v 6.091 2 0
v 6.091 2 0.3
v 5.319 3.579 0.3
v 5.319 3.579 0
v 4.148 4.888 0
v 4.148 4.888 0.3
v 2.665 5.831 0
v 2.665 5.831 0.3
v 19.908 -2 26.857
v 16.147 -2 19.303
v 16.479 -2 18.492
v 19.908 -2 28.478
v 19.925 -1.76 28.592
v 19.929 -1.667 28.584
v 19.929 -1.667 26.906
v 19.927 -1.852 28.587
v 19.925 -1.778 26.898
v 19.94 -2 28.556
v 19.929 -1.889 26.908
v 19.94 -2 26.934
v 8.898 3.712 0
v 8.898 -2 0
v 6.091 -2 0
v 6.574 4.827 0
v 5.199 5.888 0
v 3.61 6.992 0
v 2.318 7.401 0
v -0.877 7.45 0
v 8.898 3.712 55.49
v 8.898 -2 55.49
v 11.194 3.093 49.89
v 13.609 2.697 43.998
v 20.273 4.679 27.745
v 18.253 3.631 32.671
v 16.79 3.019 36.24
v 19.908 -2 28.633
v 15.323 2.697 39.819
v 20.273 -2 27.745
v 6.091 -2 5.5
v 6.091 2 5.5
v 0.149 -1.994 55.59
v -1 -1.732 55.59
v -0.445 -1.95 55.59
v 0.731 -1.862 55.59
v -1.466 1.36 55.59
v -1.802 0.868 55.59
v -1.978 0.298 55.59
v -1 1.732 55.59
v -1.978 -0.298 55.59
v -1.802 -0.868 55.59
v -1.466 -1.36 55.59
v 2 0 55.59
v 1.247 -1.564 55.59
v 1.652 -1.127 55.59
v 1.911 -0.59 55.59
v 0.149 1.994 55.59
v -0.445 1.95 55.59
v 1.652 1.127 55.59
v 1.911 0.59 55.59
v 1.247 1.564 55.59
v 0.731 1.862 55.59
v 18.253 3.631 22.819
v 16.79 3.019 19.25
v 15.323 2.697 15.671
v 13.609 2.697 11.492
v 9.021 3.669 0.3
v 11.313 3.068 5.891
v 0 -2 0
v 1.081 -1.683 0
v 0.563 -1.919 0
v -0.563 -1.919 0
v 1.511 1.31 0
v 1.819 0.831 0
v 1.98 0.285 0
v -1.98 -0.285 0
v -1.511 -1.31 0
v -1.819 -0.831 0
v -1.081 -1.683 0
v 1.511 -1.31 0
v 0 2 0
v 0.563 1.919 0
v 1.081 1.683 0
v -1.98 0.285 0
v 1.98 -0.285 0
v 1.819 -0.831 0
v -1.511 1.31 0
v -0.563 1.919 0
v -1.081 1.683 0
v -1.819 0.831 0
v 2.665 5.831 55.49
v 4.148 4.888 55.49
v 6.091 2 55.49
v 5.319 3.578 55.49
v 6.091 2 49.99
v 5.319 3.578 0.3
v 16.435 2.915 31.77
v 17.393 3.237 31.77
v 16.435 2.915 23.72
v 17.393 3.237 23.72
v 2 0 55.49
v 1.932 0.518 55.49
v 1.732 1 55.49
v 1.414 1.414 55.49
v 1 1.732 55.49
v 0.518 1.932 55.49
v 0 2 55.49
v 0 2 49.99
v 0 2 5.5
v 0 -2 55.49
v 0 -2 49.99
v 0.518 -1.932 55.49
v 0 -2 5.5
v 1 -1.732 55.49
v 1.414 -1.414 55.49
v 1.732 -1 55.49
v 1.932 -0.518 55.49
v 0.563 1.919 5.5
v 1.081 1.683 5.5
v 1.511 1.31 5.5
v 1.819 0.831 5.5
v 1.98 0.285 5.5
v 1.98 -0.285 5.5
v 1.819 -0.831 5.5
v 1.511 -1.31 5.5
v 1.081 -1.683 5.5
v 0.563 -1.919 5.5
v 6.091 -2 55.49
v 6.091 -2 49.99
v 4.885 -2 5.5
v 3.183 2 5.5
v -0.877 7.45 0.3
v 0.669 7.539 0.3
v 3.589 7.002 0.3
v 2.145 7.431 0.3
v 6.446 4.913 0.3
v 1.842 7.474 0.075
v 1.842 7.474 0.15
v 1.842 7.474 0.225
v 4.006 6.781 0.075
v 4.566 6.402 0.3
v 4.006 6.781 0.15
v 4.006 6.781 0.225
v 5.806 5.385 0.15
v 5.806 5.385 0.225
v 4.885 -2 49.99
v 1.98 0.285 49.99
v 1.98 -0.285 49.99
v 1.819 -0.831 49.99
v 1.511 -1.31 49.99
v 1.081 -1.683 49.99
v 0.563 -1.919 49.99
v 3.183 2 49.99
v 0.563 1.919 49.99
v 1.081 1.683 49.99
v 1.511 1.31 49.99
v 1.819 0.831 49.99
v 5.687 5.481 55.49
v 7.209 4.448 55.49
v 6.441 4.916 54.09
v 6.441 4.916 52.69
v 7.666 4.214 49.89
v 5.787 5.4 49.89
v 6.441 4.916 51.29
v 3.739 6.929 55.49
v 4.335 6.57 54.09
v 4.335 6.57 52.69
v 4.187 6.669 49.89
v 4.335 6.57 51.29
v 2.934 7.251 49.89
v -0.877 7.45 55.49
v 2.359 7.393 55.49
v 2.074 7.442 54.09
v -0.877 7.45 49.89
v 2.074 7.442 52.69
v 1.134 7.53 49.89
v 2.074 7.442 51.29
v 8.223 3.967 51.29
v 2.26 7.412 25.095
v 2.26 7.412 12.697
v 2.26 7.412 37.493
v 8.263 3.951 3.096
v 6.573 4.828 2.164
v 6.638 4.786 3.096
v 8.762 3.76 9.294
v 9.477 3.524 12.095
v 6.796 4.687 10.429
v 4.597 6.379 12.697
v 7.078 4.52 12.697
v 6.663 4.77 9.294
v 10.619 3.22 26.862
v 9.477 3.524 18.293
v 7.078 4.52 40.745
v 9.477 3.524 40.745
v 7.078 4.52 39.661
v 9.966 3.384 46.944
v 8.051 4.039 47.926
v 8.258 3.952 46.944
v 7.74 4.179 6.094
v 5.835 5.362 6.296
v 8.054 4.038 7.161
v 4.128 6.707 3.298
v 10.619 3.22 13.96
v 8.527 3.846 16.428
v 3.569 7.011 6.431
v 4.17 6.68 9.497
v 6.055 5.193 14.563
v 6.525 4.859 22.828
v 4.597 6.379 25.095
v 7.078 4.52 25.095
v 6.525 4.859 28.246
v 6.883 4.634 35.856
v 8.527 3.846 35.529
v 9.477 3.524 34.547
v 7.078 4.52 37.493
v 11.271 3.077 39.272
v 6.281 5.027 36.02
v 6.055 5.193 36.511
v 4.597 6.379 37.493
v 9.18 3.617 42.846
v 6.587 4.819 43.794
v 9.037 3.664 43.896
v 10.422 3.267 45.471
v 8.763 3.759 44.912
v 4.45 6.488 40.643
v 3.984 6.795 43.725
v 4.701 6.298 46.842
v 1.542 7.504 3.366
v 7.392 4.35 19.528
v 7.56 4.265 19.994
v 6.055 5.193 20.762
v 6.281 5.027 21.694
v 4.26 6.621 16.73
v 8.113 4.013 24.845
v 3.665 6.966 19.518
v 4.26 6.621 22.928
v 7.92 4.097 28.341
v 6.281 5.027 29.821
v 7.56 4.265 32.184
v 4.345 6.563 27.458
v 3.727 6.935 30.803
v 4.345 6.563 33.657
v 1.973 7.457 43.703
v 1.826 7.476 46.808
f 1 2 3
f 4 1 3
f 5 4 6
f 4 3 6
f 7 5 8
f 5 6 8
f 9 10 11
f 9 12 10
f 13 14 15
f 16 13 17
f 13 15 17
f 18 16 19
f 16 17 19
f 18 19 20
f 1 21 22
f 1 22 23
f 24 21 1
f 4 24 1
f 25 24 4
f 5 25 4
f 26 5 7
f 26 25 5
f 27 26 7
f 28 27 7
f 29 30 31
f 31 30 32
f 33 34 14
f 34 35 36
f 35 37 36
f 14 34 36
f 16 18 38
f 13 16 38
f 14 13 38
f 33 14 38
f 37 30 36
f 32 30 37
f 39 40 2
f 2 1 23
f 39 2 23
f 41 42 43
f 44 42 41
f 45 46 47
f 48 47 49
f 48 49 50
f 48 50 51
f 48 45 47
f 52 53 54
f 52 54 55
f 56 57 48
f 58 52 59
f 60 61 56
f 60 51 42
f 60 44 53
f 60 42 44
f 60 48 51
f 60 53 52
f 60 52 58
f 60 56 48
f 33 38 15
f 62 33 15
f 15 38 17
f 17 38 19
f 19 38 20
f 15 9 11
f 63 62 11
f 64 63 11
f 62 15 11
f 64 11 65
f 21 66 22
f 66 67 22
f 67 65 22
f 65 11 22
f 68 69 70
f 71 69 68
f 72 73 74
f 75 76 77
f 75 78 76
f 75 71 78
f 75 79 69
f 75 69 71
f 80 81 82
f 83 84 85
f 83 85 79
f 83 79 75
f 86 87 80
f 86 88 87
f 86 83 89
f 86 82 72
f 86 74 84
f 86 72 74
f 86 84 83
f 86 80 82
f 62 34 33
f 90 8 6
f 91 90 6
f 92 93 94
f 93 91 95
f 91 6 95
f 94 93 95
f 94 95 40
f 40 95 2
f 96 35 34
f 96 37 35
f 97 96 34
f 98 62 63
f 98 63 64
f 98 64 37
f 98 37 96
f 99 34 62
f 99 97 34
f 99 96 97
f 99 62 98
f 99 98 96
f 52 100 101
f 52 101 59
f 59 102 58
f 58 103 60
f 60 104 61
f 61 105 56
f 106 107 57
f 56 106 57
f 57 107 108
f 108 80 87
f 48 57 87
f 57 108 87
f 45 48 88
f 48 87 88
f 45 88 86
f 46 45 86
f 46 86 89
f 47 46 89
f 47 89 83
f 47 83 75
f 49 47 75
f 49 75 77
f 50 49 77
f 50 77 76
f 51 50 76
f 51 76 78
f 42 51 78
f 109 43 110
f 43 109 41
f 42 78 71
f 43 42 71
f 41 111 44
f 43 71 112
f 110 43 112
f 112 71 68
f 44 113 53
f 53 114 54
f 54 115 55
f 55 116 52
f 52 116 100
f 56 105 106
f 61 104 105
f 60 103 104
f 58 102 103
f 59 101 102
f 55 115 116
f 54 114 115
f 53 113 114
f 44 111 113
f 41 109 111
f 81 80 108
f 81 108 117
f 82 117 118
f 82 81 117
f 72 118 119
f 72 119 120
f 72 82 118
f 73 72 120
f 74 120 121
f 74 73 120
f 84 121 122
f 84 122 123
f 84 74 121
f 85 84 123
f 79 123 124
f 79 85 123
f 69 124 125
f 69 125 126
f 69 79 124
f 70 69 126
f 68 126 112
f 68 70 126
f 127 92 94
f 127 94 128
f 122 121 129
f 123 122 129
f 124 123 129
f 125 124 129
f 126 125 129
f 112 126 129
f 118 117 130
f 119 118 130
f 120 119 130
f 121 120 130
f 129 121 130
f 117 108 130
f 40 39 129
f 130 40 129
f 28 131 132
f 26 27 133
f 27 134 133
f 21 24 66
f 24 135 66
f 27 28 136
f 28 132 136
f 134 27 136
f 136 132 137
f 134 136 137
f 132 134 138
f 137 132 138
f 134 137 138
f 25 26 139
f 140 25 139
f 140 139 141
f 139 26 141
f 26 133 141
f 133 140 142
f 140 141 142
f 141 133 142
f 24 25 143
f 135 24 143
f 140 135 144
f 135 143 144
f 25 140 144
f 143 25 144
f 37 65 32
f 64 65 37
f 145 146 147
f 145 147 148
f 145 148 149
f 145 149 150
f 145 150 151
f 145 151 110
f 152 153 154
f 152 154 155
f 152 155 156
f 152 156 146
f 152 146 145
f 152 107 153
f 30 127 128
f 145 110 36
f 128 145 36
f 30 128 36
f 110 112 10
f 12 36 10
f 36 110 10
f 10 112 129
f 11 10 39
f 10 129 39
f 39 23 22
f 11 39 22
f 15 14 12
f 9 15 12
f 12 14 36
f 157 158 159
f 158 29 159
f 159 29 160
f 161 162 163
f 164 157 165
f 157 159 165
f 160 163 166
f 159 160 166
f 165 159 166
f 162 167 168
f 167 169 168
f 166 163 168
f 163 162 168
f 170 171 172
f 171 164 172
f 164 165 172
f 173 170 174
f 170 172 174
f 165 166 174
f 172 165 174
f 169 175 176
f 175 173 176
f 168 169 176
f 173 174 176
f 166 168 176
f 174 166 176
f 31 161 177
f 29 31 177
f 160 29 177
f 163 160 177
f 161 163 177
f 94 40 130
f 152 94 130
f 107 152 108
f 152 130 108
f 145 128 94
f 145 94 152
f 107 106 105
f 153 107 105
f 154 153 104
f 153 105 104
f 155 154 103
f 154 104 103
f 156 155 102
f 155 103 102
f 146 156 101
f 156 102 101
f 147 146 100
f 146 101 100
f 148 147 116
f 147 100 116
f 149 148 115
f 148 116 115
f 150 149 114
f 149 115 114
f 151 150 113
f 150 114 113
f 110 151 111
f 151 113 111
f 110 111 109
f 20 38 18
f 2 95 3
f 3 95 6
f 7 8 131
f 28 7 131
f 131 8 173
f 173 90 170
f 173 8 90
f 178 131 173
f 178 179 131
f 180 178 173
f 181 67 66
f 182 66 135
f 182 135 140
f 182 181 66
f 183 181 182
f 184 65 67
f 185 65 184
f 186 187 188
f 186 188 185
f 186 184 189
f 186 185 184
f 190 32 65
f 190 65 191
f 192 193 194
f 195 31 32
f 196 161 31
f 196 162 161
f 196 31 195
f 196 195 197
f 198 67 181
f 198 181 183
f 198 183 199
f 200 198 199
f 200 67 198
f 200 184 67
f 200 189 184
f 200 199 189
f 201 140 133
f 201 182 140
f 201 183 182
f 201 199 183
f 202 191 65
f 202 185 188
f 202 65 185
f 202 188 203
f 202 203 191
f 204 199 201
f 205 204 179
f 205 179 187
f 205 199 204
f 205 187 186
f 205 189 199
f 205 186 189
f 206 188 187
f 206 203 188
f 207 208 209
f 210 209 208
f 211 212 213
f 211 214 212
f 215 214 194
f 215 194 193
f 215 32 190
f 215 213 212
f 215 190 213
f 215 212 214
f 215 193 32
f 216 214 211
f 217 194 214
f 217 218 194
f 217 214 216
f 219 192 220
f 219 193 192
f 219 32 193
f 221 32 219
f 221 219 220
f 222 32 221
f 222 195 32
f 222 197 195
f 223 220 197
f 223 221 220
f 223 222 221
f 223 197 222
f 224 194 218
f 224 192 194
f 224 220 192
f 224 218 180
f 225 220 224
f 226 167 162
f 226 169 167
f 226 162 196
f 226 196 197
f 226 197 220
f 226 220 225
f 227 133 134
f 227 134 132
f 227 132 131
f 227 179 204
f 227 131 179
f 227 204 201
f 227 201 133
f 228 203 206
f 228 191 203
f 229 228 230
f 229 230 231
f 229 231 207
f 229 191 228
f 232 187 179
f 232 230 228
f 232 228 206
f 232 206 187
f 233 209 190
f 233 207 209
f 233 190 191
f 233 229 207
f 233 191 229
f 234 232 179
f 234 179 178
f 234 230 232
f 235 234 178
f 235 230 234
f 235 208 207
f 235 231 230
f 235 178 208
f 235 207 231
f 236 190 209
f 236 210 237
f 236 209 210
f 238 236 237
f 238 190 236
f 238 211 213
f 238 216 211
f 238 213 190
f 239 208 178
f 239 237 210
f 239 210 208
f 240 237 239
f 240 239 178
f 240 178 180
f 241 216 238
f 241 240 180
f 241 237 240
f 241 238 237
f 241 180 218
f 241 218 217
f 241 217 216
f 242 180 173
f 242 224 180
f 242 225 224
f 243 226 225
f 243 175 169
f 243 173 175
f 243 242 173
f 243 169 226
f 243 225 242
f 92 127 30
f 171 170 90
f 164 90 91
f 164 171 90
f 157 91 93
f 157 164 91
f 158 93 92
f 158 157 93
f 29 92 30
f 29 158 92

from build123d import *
from build123d.topology import SkipClean

# Parameters (mm, degrees)
BOSS_EXTRUDE1_DEPTH              = 55.49
BOSS_EXTRUDE5_DEPTH              = 4
BOSS_EXTRUDE6_START              = 51.49
BOSS_EXTRUDE6_DEPTH              = 4
BOSS_EXTRUDE7_START              = 5.6
BOSS_EXTRUDE7_DEPTH              = 44.29
SKETCH1_11_R                     = 2
BOSS_EXTRUDE8_DEPTH              = 55.59
BOSS_EXTRUDE9_DEPTH              = 55.49
BOSS_EXTRUDE10_REACH             = 60.551
SKETCH3_W                        = 44.29
SKETCH3_H                        = 4
BOSS_EXTRUDE11_START             = -49.89
BOSS_EXTRUDE11_DEPTH             = 55.49
CUT_EXTRUDE1_DEPTH               = 55.59
CUT_EXTRUDE1_DEPTH_BACK          = 55.59
BOSS_EXTRUDE12_DEPTH             = 49.59
BOSS_EXTRUDE12_DIRECTION_2_REACH = 60.225
BOSS_EXTRUDE13_DEPTH             = 4
BOSS_EXTRUDE14_START             = 51.49
BOSS_EXTRUDE14_DEPTH             = 4
BOSS_EXTRUDE15_DEPTH             = 0.3
CUT_EXTRUDE2_DEPTH               = 5.5
CUT_EXTRUDE3_START               = 55.49
CUT_EXTRUDE3_DEPTH               = 5.5
BOSS_EXTRUDE16_DEPTH             = 4
CUT_EXTRUDE4_DEPTH               = 5.5
CUT_EXTRUDE5_START               = -55.49
CUT_EXTRUDE5_DEPTH               = 5.5
CUT_EXTRUDE6_DEPTH               = 10
CUT_EXTRUDE6_DEPTH_BACK          = 10
CUT_EXTRUDE7_DEPTH               = 10


# Read off the part's stored shape, not the designer's step: Boss-Extrude6
with BuildPart() as part:
    # Sketch1 → Boss-Extrude1 (new body)
    with BuildSketch(Plane.XY):
        with BuildLine():
            ThreePointArc((1.129915274, -2.230087773), (-2.325656227, -0.917236673), (-0.696579505, 2.400995001))
            Line((-0.696579505, 2.400995001), (0.839733193, 4.443342601))
            Line((0.839733193, 4.443342601), (1.672696268, 5.550669345))
            Line((1.672696268, 5.550669345), (-1.620002468, 5.749465478))
            Line((-1.620002468, 5.749465478), (-3.736897473, 3.873630853))
            Line((-3.736897473, 3.873630853), (-4.07142398, -1.667196274))
            ThreePointArc((-4.07142398, -1.667196274), (-3.634366728, -2.93327365), (-2.430068683, -3.519479403))
            Line((-2.430068683, -3.519479403), (4.898910437, -3.961965286))
            Line((4.898910437, -3.961965286), (5.462782558, -3.357258899))
            Line((5.462782558, -3.357258899), (5.295730888, -2.964633462))
            Line((5.295730888, -2.964633462), (3.885857643, -2.716034769))
            Line((3.885857643, -2.716034769), (1.129915274, -2.230087773))
        make_face()
    extrude(amount=BOSS_EXTRUDE1_DEPTH)

    # Sketch1<8> → Boss-Extrude5 (add)
    with BuildSketch(Plane.XY):
        Polygon((1.672696268, 5.550669345), (0.839733193, 4.443342601), (3.885857643, -2.716034769), (5.295730888, -2.964633462), align=None)
    extrude(amount=BOSS_EXTRUDE5_DEPTH)

    # Boss-Extrude6 outline → Boss-Extrude6 (add)
    with BuildSketch(Plane.XY.offset(BOSS_EXTRUDE6_START)):
        Polygon((3.885857643, -2.71603477), (5.295730888, -2.964633462), (1.672696268, 5.550669345), (0.839733193, 4.443342601), align=None)
    extrude(amount=BOSS_EXTRUDE6_DEPTH)


with BuildPart() as body_2:
    # Sketch1<10> → Boss-Extrude7 (new body)
    with BuildSketch(Plane.XY.offset(BOSS_EXTRUDE7_START)):
        with BuildLine():
            Line((0, -2), (12, -2))
            Line((12, -2), (12, 2))
            Line((12, 2), (0, 2))
            ThreePointArc((0, 2), (-2, 0), (0, -2))
        make_face()
    extrude(amount=BOSS_EXTRUDE7_DEPTH)

    # Sketch1<11> → Boss-Extrude8 (add)
    with BuildSketch(Plane.XY):
        Circle(SKETCH1_11_R)
    extrude(amount=BOSS_EXTRUDE8_DEPTH)


with BuildPart() as body_3:
    # Sketch1<12> → Boss-Extrude9 (new body)
    with BuildSketch(Plane.XY):
        with BuildLine():
            Line((22.5, 2), (20.149982379, 2))
            Line((20.149982379, 2), (19.92857602, -1.667196274))
            ThreePointArc((19.92857602, -1.667196274), (19.926466234, -1.833875846), (19.940224749, -2))
            Line((19.940224749, -2), (22.5, -2))
            ThreePointArc((22.5, -2), (21.5, 0), (22.5, 2))
        make_face()
        with BuildLine():
            Line((20.263102527, 3.873630853), (20.149982379, 2))
            Line((20.149982379, 2), (22.5, 2))
            ThreePointArc((22.5, 2), (22.883559394, 2.236863959), (23.303420495, 2.400995001))
            Line((23.303420495, 2.400995001), (24.839733193, 4.443342601))
            Line((24.839733193, 4.443342601), (25.672696268, 5.550669345))
            Line((25.672696268, 5.550669345), (22.379997532, 5.749465478))
            Line((22.379997532, 5.749465478), (20.263102527, 3.873630853))
        make_face()
        with BuildLine():
            Line((22.5, -2), (19.940224749, -2))
            ThreePointArc((19.940224749, -2), (20.482001684, -3.052625751), (21.569931317, -3.519479403))
            Line((21.569931317, -3.519479403), (28.898910437, -3.961965286))
            Line((28.898910437, -3.961965286), (29.462782558, -3.357258899))
            Line((29.462782558, -3.357258899), (29.295730888, -2.964633462))
            Line((29.295730888, -2.964633462), (27.885857643, -2.716034769))
            Line((27.885857643, -2.716034769), (25.129915274, -2.230087773))
            ThreePointArc((25.129915274, -2.230087773), (23.782110643, -2.490486745), (22.5, -2))
        make_face()
    extrude(amount=BOSS_EXTRUDE9_DEPTH)

    # Boss-Extrude10: up to this face of the body (flat: up to its plane)
    boss_extrude10_end = Plane(body_3.part.faces().sort_by_distance((20.095839274, 1.10321729, 27.745))[0])
    # Sketch3 → Boss-Extrude10 (add, up to the picked face)
    with BuildSketch(Plane(origin=(12, 0, 0), x_dir=(0, 0, -1), z_dir=(1, 0, 0)), mode=Mode.PRIVATE) as boss_extrude10_sk1:
        with Locations((-27.745, 0)):
            Rectangle(SKETCH3_W, SKETCH3_H)
    boss_extrude10_tool1 = split(extrude(boss_extrude10_sk1.sketch, amount=BOSS_EXTRUDE10_REACH, mode=Mode.PRIVATE), bisect_by=boss_extrude10_end, keep=Keep.BOTH, mode=Mode.PRIVATE)

    add(body_2.part)  # Boss-Extrude10 merges body 2
    add(boss_extrude10_tool1.solids().sort_by(Axis((12, 0, 27.745), (1, 0, 0)))[0])

    # Sketch4 → Boss-Extrude11 (add)
    with BuildSketch(Plane.XY.offset(49.89).offset(BOSS_EXTRUDE11_START)):
        with BuildLine():
            Line((20.263102527, 3.873630853), (25.672696268, 5.550669345))
            add(Edge.make_bspline(
                [(18.253064845, 3.63105347), (20.126675338, 4.576543011), (21.657010209, 5.806862999), (25.672696268, 5.550669345)],
                knots=[0.306550142, 0.306550142, 0.306550142, 0.306550142, 1, 1, 1, 1], degree=3))
            add(Edge.make_bspline(
                [(15.322676772, 2.697160199), (16.529464831, 2.850779242), (17.424806601, 3.213085323), (18.253064845, 3.63105347)],
                knots=[0, 0, 0, 0, 0.306550142, 0.306550142, 0.306550142, 0.306550142], degree=3))
            Line((15.322676772, 2.697160199), (13.609149986, 2.697160199))
            Line((13.609149986, 2.697160199), (13.609149986, 2))
            Line((13.609149986, 2), (0, 2))
            ThreePointArc((0, 2), (2, 0), (0, -2))
            Line((0, -2), (6.092058814, -2))
            Line((6.092058814, -2), (19.908483051, -2))
            Line((19.908483051, -2), (20.263102527, 3.873630853))
        make_face()
    extrude(amount=BOSS_EXTRUDE11_DEPTH)

    # Sketch4<5> → Cut-Extrude1 (cut, two sides: drawn at the far end of the back side and taken through both)
    with BuildSketch(Plane.XY.offset(49.89).offset(-CUT_EXTRUDE1_DEPTH_BACK)):
        with BuildLine():
            add(Edge.make_bspline(
                [(18.253064845, 3.63105347), (20.126675338, 4.576543011), (21.657010209, 5.806862999), (25.672696268, 5.550669345)],
                knots=[0.306550142, 0.306550142, 0.306550142, 0.306550142, 1, 1, 1, 1], degree=3))
            Line((25.672696268, 5.550669345), (19.033452373, 9.878906939))
            Line((19.033452373, 9.878906939), (18.253064845, 3.63105347))
        make_face()
    extrude(amount=CUT_EXTRUDE1_DEPTH + CUT_EXTRUDE1_DEPTH_BACK, mode=Mode.SUBTRACT)

    # Sketch4<6> → Boss-Extrude12 (add)
    with BuildSketch(Plane.XY.offset(49.89)):
        with BuildLine():
            Line((6.092058814, 2), (13.609149986, 2))
            Line((13.609149986, 2), (13.609149986, 2.697160199))
            add(Edge.make_bspline(
                [(13.609149986, 2.697160199), (3.008937487, 4.043912628), (6.643549935, 7.427073901), (2.231724762, 7.792821065), (-0.877126137, 7.449933099)],
                knots=[0, 0, 0, 0, 0, 1, 1, 1, 1, 1], degree=4))
            Line((-0.877126137, 7.449933099), (2.665214437, 5.830739223))
            ThreePointArc((2.665214437, 5.830739223), (4.778774076, 4.27366426), (6.091049818, 2))
            Line((6.091049818, 2), (6.092058814, 2))
        make_face()
    extrude(amount=-BOSS_EXTRUDE12_DEPTH)

    # Boss-Extrude12 direction 2: up to this face of the body (flat: up to its plane)
    boss_extrude12_direction_2_end = Plane(body_3.part.faces().sort_by_distance((14.730018873, 0.349949508, 55.49))[0])
    # Sketch4<6> → Boss-Extrude12 direction 2 (add, up to the picked face)
    with BuildSketch(Plane.XY.offset(49.89), mode=Mode.PRIVATE) as boss_extrude12_direction_2_sk1:
        with BuildLine():
            Line((6.092058814, 2), (13.609149986, 2))
            Line((13.609149986, 2), (13.609149986, 2.697160199))
            add(Edge.make_bspline(
                [(13.609149986, 2.697160199), (3.008937487, 4.043912628), (6.643549935, 7.427073901), (2.231724762, 7.792821065), (-0.877126137, 7.449933099)],
                knots=[0, 0, 0, 0, 0, 1, 1, 1, 1, 1], degree=4))
            Line((-0.877126137, 7.449933099), (2.665214437, 5.830739223))
            ThreePointArc((2.665214437, 5.830739223), (4.778774076, 4.27366426), (6.091049818, 2))
            Line((6.091049818, 2), (6.092058814, 2))
        make_face()
    boss_extrude12_direction_2_tool1 = split(extrude(boss_extrude12_direction_2_sk1.sketch, amount=BOSS_EXTRUDE12_DIRECTION_2_REACH, mode=Mode.PRIVATE), bisect_by=boss_extrude12_direction_2_end, keep=Keep.BOTH, mode=Mode.PRIVATE)
    add(boss_extrude12_direction_2_tool1.solids().sort_by(Axis((6.524615, 4.223787, 49.89), (0, 0, 1)))[0])

    # Sketch1<13> → Boss-Extrude13 (add)
    with BuildSketch(Plane.XY):
        Polygon((25.672696268, 5.550669345), (24.839733193, 4.443342601), (27.885857643, -2.716034769), (29.295730888, -2.964633462), align=None)
    extrude(amount=BOSS_EXTRUDE13_DEPTH)

    # Sketch1<14> → Boss-Extrude14 (add)
    with BuildSketch(Plane.XY.offset(BOSS_EXTRUDE14_START)):
        Polygon((25.672696268, 5.550669345), (24.839733193, 4.443342601), (27.885857643, -2.716034769), (29.295730888, -2.964633462), align=None)
    extrude(amount=BOSS_EXTRUDE14_DEPTH)

    # Sketch5 → Boss-Extrude15 (add)
    with BuildSketch(Plane(origin=(0, 0, 0.3), x_dir=(-1, 0, 0), z_dir=(0, 0, -1))):
        with BuildLine():
            Line((-13.609149986, 2), (-6.091302067, 2))
            ThreePointArc((-6.091302067, 2), (-4.778900201, 4.273690642), (-2.665214437, 5.830739223))
            Line((-2.665214437, 5.830739223), (0.877126137, 7.449933099))
            add(Edge.make_bspline(
                [(0.877126137, 7.449933099), (-2.231724762, 7.792821065), (-6.643549935, 7.427073901), (-3.008937487, 4.043912628), (-13.609149986, 2.697160199)],
                knots=[0, 0, 0, 0, 0, 1, 1, 1, 1, 1], degree=4))
            Line((-13.609149986, 2.697160199), (-13.609149986, 2))
        make_face()
    extrude(amount=BOSS_EXTRUDE15_DEPTH)

    # Sketch1<15> → Cut-Extrude2 (cut)
    with SkipClean():  # the faces are left unmerged after this step: merging them gives an invalid solid
        with BuildSketch(Plane.XY):
            with BuildLine():
                Line((0, -2), (4.885305034, -2))
                Line((4.885305034, -2), (3.183411536, 2))
                Line((3.183411536, 2), (0, 2))
                ThreePointArc((0, 2), (2, 0), (0, -2))
            make_face()
        extrude(amount=CUT_EXTRUDE2_DEPTH, mode=Mode.SUBTRACT)

    # Sketch1<16> → Cut-Extrude3 (cut)
    with SkipClean():  # the faces are left unmerged after this step: merging them gives an invalid solid
        with BuildSketch(Plane.XY.offset(CUT_EXTRUDE3_START)):
            with BuildLine():
                Line((0, -2), (4.885305034, -2))
                Line((4.885305034, -2), (3.183411536, 2))
                Line((3.183411536, 2), (0, 2))
                ThreePointArc((0, 2), (2, 0), (0, -2))
            make_face()
        extrude(amount=-CUT_EXTRUDE3_DEPTH, mode=Mode.SUBTRACT)

    # Sketch1<17> → Boss-Extrude16 (add)
    with SkipClean():  # the faces are left unmerged after this step: merging them gives an invalid solid
        with BuildSketch(Plane.XY):
            with BuildLine():
                Line((24.839733193, 4.443342601), (23.303420495, 2.400995001))
                ThreePointArc((23.303420495, 2.400995001), (25.50142453, 1.998930809), (26.5, 0))
                ThreePointArc((26.5, 0), (26.499999366, -0.001781138), (26.499997462, -0.003562276))
                ThreePointArc((26.499997462, -0.003562276), (26.129183075, -1.310182978), (25.129915274, -2.230087773))
                Line((25.129915274, -2.230087773), (27.885857643, -2.716034769))
                Line((27.885857643, -2.716034769), (24.839733193, 4.443342601))
            make_face()
        extrude(amount=BOSS_EXTRUDE16_DEPTH)

    # Sketch6 → Cut-Extrude4 (cut)
    with SkipClean():  # the faces are left unmerged after this step: merging them gives an invalid solid
        with BuildSketch(Plane(origin=(0, 0, 0), x_dir=(-1, 0, 0), z_dir=(0, 0, -1))):
            Polygon((-3.183411536, 2), (-6.091302067, 2), (-6.091302067, -2), (-4.885305034, -2), align=None)
        extrude(amount=-CUT_EXTRUDE4_DEPTH, mode=Mode.SUBTRACT)

    # Sketch6<3> → Cut-Extrude5 (cut)
    with SkipClean():  # the faces are left unmerged after this step: merging them gives an invalid solid
        with BuildSketch(Plane(origin=(0, 0, 0), x_dir=(-1, 0, 0), z_dir=(0, 0, -1)).offset(CUT_EXTRUDE5_START)):
            Polygon((-3.183411536, 2), (-6.091302067, 2), (-6.091302067, -2), (-4.885305034, -2), align=None)
        extrude(amount=CUT_EXTRUDE5_DEPTH, mode=Mode.SUBTRACT)

    # Sketch8 → Cut-Extrude6 (cut, two sides: drawn at the far end of the back side and taken through both)
    with SkipClean():  # the faces are left unmerged after this step: merging them gives an invalid solid
        with BuildSketch(Plane(origin=(0, 0, 0), x_dir=(1, 0, 0), z_dir=(0, 1, 0)).offset(-CUT_EXTRUDE6_DEPTH_BACK)):
            Polygon((8.89773256, -55.49), (20.272550796, -27.745), (8.89773256, 0), (9.632888589, 3.803128997), (30.927801349, 3.803128997), (32.833315741, -63.036420075), (8.89773256, -70.58284015), align=None)
        extrude(amount=CUT_EXTRUDE6_DEPTH + CUT_EXTRUDE6_DEPTH_BACK, mode=Mode.SUBTRACT)

    # Sketch9 → Cut-Extrude7 (cut, along a direction that is not the sketch's normal)
    with SkipClean():  # the faces are left unmerged after this step: merging them gives an invalid solid
        with BuildSketch(Plane(origin=(27.093463658, 0, 11.107703171), x_dir=(0.3793352445024156, 0, -0.9252593000225896), z_dir=(0.9252593000225896, 0, 0.3793352445024156))):
            with BuildLine():
                Line((-17.981226266, -2), (-18.857301063, -2))
                add(Edge.make_bspline(
                    [(-18.857301063, -2), (-18.700912393, -2.452788244), (-17.981226266, -2.818856866)],
                    knots=[3.273172267, 3.273172267, 3.273172267, 3.782379861, 3.782379861, 3.782379861], degree=2, weights=[0.975822264, 0.955830127, 1]))
                Line((-17.981226266, -2.818856866), (-17.981226266, -2))
            make_face()
        extrude(amount=-CUT_EXTRUDE7_DEPTH, dir=(0.3793352445024153, 0, 0.9252593000225898), mode=Mode.SUBTRACT)


solid = body_3.part
